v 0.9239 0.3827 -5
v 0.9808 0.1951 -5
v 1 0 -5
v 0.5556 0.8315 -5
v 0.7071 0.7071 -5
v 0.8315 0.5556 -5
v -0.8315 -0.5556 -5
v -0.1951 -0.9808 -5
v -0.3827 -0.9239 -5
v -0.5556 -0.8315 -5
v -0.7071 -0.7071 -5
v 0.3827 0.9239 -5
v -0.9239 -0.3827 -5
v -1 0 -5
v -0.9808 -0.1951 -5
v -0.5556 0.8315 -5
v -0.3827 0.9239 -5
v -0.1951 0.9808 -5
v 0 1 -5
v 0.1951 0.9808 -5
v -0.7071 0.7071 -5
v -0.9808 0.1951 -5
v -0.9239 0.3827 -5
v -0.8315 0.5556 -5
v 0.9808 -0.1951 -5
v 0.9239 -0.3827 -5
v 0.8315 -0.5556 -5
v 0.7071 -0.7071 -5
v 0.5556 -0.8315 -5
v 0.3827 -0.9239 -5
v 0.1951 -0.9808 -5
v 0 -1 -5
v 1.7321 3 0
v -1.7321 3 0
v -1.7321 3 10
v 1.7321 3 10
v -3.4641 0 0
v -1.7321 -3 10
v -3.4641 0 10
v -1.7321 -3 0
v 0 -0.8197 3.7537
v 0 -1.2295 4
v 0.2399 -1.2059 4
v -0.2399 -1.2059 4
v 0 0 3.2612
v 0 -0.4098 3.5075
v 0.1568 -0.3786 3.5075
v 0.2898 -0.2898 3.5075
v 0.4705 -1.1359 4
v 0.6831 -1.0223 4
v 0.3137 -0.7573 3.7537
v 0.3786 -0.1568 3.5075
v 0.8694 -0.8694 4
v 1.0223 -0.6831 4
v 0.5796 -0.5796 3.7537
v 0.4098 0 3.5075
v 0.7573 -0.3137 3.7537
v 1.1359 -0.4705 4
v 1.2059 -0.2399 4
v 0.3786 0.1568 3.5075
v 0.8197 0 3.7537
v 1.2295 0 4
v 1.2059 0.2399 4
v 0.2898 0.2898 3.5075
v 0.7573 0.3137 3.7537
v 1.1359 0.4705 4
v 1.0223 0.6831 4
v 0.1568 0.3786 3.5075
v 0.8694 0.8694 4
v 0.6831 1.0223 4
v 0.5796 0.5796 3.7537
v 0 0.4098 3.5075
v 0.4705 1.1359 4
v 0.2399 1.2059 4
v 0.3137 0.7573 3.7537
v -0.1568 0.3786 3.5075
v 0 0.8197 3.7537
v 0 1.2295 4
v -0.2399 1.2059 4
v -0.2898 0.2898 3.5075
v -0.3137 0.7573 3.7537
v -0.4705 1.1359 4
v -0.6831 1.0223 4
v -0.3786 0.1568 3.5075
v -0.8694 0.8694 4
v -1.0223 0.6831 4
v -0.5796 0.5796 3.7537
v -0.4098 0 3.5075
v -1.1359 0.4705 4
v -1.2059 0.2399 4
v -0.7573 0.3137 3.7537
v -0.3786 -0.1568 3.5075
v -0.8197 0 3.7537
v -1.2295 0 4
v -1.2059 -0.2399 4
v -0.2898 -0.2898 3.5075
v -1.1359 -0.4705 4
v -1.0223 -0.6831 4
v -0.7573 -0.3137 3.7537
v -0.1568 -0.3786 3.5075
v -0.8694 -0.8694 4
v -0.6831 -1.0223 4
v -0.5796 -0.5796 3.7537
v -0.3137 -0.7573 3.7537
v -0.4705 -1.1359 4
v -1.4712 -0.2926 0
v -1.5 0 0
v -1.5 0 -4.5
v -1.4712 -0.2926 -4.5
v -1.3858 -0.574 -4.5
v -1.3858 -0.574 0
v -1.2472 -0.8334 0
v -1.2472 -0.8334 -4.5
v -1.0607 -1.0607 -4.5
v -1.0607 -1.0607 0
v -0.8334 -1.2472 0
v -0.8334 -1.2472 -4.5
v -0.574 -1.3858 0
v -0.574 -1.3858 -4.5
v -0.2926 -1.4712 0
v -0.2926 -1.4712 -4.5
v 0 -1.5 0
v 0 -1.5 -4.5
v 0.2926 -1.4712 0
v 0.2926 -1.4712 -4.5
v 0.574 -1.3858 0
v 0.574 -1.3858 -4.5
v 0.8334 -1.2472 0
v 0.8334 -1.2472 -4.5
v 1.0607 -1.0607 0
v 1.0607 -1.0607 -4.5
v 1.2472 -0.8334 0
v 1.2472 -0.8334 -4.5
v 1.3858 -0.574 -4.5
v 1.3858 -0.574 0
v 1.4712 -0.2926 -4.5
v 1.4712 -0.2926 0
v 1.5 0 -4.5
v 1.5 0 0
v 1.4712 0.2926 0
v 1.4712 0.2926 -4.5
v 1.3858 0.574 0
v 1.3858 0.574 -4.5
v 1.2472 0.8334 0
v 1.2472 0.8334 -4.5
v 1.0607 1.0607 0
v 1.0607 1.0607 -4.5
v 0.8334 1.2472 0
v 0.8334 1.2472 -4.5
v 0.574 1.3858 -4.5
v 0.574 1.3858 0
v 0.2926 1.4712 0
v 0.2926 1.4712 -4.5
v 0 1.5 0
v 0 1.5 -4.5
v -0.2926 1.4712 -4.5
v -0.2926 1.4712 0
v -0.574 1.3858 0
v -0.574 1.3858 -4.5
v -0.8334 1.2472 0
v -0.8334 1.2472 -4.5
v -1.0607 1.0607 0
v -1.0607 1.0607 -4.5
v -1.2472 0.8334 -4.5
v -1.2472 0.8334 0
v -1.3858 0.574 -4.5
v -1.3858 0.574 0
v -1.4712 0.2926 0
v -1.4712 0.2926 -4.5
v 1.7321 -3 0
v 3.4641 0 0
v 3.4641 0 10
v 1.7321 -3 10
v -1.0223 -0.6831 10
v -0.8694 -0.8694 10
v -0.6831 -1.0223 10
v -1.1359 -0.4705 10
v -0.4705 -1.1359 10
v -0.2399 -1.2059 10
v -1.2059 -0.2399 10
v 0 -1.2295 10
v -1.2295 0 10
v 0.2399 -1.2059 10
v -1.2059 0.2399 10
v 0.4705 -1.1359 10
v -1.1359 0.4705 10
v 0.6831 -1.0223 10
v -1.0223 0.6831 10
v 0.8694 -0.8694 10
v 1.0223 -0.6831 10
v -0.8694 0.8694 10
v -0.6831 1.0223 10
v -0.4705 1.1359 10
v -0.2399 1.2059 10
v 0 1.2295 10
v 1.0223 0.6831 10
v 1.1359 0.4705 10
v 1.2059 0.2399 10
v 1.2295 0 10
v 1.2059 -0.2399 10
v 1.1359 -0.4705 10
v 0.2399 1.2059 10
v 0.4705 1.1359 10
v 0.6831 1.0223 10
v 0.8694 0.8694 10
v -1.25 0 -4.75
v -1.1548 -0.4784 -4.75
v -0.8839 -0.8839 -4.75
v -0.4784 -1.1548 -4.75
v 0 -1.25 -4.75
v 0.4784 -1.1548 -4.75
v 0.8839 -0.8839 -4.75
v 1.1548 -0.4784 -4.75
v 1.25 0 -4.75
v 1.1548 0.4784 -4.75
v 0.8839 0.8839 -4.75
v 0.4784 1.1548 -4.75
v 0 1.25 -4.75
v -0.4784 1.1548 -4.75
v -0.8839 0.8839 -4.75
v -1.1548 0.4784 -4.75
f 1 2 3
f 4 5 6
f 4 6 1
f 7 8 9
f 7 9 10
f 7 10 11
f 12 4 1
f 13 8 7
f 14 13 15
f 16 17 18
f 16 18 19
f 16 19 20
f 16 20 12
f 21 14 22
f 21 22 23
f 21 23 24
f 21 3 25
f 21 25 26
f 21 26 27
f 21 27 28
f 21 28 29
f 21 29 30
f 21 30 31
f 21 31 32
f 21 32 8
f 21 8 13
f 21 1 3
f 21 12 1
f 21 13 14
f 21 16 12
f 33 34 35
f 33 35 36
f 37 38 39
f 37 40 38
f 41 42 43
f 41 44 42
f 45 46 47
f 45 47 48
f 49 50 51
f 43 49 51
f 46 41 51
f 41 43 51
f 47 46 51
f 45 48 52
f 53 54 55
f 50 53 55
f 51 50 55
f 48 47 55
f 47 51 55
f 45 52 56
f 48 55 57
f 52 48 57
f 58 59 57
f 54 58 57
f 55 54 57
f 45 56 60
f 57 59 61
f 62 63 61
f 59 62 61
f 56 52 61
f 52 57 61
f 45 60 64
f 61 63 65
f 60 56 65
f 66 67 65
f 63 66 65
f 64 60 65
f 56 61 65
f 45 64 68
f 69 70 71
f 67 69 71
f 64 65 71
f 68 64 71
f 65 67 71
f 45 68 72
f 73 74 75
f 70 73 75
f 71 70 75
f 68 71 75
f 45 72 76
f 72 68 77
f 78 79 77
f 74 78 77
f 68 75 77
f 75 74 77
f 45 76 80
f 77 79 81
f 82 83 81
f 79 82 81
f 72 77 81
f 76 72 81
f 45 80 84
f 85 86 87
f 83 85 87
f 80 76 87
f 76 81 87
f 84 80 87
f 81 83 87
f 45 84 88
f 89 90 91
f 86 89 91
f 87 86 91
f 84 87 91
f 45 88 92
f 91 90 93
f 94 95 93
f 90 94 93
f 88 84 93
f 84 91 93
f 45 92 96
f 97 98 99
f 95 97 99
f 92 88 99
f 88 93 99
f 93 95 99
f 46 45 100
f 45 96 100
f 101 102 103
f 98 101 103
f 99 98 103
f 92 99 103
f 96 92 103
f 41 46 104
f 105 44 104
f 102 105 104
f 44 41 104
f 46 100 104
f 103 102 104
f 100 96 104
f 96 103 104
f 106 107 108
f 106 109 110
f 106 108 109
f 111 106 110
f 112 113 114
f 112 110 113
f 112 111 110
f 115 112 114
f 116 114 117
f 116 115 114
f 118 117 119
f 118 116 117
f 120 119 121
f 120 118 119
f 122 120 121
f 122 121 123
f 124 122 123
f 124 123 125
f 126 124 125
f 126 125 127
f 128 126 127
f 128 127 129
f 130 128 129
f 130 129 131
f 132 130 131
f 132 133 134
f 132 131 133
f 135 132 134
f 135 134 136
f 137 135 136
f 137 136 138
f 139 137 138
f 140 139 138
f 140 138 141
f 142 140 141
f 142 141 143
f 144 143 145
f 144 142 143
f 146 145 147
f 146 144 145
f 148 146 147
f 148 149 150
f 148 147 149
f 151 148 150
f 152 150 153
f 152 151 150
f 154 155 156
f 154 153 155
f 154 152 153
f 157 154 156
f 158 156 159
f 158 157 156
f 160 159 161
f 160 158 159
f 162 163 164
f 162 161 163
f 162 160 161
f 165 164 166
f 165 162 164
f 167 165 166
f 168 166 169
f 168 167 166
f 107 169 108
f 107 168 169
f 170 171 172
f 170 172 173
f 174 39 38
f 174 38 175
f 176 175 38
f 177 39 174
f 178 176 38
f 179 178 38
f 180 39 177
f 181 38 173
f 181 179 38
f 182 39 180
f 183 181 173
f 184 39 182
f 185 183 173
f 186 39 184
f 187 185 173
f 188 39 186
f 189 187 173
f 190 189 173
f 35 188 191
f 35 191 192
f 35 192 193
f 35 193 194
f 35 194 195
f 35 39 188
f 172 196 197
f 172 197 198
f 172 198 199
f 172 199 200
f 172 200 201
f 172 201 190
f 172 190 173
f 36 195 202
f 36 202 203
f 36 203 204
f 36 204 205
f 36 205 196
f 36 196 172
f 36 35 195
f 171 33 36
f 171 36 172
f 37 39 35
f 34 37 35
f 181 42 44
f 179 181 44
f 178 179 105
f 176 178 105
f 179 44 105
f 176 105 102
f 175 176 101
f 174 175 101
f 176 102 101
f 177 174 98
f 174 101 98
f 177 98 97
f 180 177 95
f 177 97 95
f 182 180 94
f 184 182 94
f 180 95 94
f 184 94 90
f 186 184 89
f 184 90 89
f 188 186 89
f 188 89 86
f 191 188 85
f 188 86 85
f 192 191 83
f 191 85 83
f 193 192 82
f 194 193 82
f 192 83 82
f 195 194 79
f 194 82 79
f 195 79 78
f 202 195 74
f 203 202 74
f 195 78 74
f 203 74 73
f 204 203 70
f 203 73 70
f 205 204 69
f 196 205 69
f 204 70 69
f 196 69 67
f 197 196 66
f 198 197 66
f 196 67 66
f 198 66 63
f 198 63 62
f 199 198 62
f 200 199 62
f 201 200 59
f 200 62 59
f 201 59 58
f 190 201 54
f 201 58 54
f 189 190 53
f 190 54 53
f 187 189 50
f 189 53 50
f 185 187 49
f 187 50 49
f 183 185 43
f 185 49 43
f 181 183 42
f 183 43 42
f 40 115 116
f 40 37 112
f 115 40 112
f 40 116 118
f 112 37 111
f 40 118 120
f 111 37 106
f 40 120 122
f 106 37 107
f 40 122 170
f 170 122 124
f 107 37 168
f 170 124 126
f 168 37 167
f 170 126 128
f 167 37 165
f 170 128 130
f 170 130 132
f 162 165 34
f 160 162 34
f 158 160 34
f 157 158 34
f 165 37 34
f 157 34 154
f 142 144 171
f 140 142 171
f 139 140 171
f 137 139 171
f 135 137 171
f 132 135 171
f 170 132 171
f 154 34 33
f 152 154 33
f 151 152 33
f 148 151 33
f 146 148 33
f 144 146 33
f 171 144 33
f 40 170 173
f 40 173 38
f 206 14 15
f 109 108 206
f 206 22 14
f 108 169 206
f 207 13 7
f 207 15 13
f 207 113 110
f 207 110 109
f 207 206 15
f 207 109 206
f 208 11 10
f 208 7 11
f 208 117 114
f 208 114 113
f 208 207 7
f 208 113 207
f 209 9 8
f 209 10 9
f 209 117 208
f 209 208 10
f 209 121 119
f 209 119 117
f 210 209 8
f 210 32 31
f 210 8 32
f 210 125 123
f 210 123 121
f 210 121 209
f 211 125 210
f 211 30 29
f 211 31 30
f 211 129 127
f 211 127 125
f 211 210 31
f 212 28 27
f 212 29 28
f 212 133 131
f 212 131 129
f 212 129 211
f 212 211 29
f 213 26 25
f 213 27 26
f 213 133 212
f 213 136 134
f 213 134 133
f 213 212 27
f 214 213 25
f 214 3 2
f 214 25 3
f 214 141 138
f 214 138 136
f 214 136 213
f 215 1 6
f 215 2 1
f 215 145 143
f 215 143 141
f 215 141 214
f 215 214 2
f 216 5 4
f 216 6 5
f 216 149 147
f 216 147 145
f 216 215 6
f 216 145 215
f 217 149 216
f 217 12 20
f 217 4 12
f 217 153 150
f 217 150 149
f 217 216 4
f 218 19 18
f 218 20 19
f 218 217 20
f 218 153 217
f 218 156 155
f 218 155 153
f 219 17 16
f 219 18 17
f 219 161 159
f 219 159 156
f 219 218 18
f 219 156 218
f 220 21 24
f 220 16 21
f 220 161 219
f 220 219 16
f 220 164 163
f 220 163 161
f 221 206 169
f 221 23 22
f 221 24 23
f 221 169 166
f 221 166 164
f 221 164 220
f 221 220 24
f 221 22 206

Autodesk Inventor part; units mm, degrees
ref_plane "YZ Plane" through (0, 0, 0) normal (1, 0, 0) x (0, 1, 0)
ref_plane "XZ Plane" through (0, 0, 0) normal (0, 1, 0) x (-1, 0, 0)
ref_plane "XY Plane" through (0, 0, 0) normal (0, 0, 1) x (1, 0, 0)
sketch "Sketch1" plane through (0, 0, 0) normal (0, 0, 1) x (1, 0, 0)
  line L0 (0, 4.2) -> (0, -4.2) projected
  line L1 (-4.8497, 0) -> (4.8497, 0) projected
  line L2 (-3.4641, 0) -> (-1.7321, 3)
  line L3 (-1.7321, 3) -> (1.7321, 3)
  line L4 (1.7321, 3) -> (3.4641, 0)
  line L5 (3.4641, 0) -> (1.7321, -3)
  line L6 (1.7321, -3) -> (-1.7321, -3)
  line L7 (-1.7321, -3) -> (-3.4641, 0)
  point P0 (0, 0)
  dimension "d0" = 6
extrude "Extrusion1" add sketch "Sketch1" along normal blind 10
sketch "Sketch2" plane through (0, 0, 10) normal (0, 0, 1) x (1, 0, 0)
  point P0 (0, 0)
  point P1 (0, 0)
hole "Hole1" at (0, 0, 10) direction (0, 0, -1) diameter 2.459 depth 6 tip angle 118 thread size "M3x0.5" class "6H" standard "ISO Metric profile"
sketch "Sketch3" plane through (0, 0, 0) normal (0, 0, -1) x (-1, 0, 0)
  circle A0 centre (0, 0) radius 1.5
  dimension "d10" = 3
extrude "Extrusion2" add sketch "Sketch3" along normal blind 5
chamfer "Chamfer1" distance 0.5 angle 45 1 edges at (1.5, 0, -5)
thread "Thread1" size "M3x0.5" class "6g" standard "ISO Metric profile" full length
properties part number "Entretoise Hex 6 x 10"
